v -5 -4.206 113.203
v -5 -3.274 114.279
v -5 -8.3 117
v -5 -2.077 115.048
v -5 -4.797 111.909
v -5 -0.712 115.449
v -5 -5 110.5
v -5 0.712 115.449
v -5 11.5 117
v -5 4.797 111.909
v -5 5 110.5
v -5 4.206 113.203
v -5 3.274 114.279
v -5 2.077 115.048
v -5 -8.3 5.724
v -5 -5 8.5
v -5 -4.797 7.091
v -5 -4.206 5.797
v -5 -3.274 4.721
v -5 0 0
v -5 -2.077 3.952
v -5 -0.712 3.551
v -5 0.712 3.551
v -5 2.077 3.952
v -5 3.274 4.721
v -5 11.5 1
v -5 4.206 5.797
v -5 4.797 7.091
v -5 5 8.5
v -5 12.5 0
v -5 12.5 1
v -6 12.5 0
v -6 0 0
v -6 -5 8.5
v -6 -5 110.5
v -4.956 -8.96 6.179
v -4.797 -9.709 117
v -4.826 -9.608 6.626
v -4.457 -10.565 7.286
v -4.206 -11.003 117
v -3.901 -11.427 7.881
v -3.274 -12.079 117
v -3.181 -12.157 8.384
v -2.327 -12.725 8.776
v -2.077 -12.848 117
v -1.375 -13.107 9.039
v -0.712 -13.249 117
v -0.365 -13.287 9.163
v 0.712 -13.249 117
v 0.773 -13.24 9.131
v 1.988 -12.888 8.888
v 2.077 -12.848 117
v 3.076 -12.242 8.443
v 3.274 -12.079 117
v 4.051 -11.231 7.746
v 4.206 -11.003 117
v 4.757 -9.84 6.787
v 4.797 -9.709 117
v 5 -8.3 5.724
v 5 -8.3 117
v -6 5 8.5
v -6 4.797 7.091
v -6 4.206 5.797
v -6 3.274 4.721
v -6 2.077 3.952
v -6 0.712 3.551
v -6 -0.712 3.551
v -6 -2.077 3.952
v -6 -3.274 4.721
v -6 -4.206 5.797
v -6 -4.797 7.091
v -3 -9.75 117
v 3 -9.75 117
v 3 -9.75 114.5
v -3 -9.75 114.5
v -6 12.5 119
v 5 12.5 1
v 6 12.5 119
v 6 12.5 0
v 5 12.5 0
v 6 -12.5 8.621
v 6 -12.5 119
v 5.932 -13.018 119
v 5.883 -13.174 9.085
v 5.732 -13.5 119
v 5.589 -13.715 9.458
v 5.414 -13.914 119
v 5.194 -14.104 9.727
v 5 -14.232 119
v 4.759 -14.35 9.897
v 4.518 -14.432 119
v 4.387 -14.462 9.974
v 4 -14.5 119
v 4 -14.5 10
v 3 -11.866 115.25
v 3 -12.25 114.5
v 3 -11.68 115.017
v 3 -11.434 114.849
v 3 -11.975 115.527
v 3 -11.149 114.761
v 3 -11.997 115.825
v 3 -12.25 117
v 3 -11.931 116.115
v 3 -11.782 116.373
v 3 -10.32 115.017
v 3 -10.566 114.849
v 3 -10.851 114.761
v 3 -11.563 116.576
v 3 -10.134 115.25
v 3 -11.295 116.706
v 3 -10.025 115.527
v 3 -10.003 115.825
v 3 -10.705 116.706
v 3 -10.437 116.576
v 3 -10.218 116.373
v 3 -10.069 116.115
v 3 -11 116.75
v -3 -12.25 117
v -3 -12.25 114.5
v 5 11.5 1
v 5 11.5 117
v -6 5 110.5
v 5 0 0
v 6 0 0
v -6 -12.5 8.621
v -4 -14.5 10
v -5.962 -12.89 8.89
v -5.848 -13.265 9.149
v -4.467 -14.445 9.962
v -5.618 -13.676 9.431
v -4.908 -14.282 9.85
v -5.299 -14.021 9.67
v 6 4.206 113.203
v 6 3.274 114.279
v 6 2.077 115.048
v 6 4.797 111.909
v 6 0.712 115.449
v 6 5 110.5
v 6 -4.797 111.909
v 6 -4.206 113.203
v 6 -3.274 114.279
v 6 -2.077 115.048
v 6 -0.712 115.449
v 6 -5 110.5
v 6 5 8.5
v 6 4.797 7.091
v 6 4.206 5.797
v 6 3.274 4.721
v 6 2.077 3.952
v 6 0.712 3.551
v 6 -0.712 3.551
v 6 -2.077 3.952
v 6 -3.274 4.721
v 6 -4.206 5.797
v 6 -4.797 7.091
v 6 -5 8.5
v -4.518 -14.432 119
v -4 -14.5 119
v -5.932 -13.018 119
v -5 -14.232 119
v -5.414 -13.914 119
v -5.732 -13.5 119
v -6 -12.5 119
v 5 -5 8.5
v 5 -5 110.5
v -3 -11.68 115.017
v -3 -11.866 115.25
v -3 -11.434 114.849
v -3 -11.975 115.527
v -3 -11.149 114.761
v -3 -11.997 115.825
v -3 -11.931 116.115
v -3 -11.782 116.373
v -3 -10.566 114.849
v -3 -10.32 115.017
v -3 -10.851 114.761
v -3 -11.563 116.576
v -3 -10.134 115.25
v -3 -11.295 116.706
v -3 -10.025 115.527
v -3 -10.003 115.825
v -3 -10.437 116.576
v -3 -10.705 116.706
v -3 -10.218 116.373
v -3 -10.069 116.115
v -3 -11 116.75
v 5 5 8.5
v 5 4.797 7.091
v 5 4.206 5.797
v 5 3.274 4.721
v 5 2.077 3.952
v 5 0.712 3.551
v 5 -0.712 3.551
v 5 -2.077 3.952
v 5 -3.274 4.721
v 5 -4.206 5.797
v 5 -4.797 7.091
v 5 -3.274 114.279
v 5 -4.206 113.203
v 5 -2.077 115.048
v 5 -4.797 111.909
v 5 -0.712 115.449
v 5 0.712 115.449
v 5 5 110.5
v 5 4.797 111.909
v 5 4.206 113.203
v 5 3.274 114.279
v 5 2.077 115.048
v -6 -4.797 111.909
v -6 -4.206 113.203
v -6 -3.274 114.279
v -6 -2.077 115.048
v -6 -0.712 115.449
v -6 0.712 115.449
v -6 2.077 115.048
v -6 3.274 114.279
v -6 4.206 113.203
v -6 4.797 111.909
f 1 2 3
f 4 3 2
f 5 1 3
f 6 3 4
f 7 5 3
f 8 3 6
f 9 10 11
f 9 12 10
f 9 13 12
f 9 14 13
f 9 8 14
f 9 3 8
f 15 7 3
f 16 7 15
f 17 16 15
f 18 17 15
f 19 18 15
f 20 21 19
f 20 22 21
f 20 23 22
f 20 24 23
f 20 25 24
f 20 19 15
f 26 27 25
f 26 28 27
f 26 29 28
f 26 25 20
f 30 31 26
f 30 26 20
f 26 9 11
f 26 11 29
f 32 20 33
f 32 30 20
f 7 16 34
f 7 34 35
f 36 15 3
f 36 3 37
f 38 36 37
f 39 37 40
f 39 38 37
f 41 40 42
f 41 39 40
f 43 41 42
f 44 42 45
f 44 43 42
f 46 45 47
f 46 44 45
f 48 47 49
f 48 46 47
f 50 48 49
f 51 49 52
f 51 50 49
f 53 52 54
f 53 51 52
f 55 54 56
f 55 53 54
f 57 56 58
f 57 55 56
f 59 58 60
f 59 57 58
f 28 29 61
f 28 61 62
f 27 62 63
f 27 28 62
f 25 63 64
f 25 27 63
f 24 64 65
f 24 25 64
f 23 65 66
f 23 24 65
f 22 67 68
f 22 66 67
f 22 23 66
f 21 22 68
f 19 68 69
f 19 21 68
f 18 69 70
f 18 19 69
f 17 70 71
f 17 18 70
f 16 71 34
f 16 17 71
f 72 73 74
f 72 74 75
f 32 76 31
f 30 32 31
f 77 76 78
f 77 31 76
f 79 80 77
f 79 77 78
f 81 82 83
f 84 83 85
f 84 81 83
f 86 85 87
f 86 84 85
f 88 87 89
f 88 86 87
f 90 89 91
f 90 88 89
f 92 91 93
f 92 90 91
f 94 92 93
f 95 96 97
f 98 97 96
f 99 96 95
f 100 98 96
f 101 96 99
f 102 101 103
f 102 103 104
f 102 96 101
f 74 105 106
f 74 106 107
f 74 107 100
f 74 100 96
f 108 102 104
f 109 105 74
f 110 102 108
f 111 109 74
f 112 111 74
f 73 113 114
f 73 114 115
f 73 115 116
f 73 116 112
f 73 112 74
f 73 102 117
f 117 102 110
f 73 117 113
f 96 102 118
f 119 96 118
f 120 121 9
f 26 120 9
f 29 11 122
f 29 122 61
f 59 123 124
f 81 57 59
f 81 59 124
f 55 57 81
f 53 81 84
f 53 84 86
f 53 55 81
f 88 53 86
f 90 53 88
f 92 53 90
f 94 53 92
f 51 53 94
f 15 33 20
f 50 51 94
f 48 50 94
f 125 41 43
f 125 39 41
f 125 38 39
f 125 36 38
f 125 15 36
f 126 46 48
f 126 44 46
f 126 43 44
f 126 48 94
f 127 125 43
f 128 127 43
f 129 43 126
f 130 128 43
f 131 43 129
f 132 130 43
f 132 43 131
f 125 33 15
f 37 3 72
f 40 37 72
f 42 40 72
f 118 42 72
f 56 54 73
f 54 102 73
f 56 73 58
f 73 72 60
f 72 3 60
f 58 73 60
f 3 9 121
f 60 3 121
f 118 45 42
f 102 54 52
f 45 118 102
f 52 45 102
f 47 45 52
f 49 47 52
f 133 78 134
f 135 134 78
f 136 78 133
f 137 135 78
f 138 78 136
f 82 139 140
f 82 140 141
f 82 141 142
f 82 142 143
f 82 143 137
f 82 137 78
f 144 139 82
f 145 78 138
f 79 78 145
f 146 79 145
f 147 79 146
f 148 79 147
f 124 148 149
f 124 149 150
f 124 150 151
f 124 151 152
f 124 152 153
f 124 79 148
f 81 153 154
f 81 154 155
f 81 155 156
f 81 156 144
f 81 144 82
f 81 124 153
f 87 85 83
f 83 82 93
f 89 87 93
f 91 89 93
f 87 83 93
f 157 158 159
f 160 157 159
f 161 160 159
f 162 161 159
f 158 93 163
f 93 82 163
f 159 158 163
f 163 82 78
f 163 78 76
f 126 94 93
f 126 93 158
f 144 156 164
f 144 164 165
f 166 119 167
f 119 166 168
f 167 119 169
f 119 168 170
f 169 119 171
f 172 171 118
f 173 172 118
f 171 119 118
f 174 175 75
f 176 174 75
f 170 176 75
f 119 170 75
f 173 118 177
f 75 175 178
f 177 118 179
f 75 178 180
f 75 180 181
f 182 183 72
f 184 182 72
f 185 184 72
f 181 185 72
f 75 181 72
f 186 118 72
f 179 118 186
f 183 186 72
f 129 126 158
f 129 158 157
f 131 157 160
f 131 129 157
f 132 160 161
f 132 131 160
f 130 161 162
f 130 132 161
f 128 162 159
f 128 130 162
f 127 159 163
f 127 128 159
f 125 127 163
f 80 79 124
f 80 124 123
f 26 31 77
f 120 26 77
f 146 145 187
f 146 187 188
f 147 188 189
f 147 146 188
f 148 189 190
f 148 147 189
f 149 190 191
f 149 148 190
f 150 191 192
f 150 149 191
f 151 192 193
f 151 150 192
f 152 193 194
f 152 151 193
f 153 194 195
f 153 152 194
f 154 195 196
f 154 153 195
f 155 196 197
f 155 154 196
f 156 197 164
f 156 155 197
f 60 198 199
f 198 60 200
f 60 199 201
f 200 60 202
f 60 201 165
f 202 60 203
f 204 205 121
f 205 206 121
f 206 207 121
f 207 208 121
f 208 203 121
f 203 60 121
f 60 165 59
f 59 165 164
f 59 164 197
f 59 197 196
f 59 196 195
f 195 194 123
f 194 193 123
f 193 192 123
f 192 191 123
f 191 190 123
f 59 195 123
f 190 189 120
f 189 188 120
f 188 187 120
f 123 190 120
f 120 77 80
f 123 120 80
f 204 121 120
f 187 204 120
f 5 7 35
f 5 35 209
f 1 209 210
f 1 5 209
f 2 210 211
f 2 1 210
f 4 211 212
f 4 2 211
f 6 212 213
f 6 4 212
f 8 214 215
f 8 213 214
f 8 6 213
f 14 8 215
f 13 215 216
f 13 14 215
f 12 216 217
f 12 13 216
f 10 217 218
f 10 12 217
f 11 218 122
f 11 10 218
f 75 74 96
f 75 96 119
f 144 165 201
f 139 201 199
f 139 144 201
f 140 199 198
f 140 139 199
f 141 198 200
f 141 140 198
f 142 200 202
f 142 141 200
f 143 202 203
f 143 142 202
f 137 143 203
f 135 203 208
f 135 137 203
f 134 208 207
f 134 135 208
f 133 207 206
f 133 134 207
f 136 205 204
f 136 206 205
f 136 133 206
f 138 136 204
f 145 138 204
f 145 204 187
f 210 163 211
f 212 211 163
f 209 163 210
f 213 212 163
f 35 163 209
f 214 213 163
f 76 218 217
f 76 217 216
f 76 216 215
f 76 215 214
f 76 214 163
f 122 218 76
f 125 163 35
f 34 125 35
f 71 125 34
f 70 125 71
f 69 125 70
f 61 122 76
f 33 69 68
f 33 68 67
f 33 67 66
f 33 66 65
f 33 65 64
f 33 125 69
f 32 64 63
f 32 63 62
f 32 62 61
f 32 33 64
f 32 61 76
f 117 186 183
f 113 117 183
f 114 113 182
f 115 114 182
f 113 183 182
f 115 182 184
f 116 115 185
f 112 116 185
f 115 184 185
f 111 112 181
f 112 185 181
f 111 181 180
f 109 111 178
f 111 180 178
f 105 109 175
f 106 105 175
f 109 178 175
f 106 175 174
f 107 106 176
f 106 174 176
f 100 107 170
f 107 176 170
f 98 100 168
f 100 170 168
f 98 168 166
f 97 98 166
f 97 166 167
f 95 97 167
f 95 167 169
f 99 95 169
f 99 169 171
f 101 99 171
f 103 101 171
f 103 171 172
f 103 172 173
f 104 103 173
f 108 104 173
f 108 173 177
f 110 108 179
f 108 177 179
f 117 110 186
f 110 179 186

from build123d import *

# Parameters (mm, degrees)
BOSS_EXTRUDE1_DEPTH     = 119
CUT_EXTRUDE1_DEPTH      = 117
CUT_EXTRUDE2_DEPTH      = 121.479251326
SKETCH5_W               = 10
SKETCH5_H               = 2
CUT_EXTRUDE4_DEPTH      = 123.172009888
CUT_EXTRUDE5_DEPTH      = 121.030204532
CUT_EXTRUDE5_DEPTH_BACK = 121.030204532
SKETCH7_W               = 6
SKETCH7_H               = 2.5
BOSS_EXTRUDE2_DEPTH     = 2.5
SKETCH10_R              = 1
CUT_EXTRUDE6_DEPTH      = 6


with BuildPart() as part:
    # Sketch1 → Boss-Extrude1 (new body)
    with BuildSketch(Plane.XY):
        with BuildLine():
            Line((-6, 12.5), (6, 12.5))
            Line((6, 12.5), (6, -12.5))
            ThreePointArc((6, -12.5), (5.414213562, -13.914213562), (4, -14.5))
            Line((4, -14.5), (-4, -14.5))
            ThreePointArc((-4, -14.5), (-5.414213562, -13.914213562), (-6, -12.5))
            Line((-6, -12.5), (-6, 12.5))
        make_face()
    extrude(amount=BOSS_EXTRUDE1_DEPTH)

    # Sketch2 → Cut-Extrude1 (cut)
    with BuildSketch(Plane(origin=(0, 0, 0), x_dir=(-1, 0, 0), z_dir=(0, 0, -1))):
        with BuildLine():
            Line((-5, -8.3), (-5, 11.5))
            Line((-5, 11.5), (5, 11.5))
            Line((5, 11.5), (5, -8.3))
            ThreePointArc((5, -8.3), (0, -13.3), (-5, -8.3))
        make_face()
    extrude(amount=-CUT_EXTRUDE1_DEPTH, mode=Mode.SUBTRACT)

    # Sketch3 → Cut-Extrude2 (cut, through all)
    with BuildSketch(Plane(origin=(6, 0, 0), x_dir=(0, 0, -1), z_dir=(1, 0, 0))):
        with BuildLine():
            Line((-8.499997834, -5), (-110.499997834, -5))
            ThreePointArc((-110.499997834, -5), (-115.500002166, -2.166e-06), (-110.500002166, 5))
            Line((-110.500002166, 5), (-8.500002166, 5))
            ThreePointArc((-8.500002166, 5), (-3.500002166, 2.166e-06), (-8.499997834, -5))
        make_face()
    extrude(amount=-CUT_EXTRUDE2_DEPTH, mode=Mode.SUBTRACT)

    # Sketch5 → Cut-Extrude4 (cut, through all)
    with BuildSketch(Plane(origin=(0, 12.5, 0), x_dir=(1, 0, 0), z_dir=(0, 1, 0))):
        Rectangle(SKETCH5_W, SKETCH5_H)
    extrude(amount=-CUT_EXTRUDE4_DEPTH, mode=Mode.SUBTRACT)

    # Sketch6 → Cut-Extrude5 (cut, two sides: drawn at the far end of the back side and taken through both)
    with BuildSketch(Plane(origin=(0, 0, 0), x_dir=(0, 0, -1), z_dir=(1, 0, 0)).offset(-CUT_EXTRUDE5_DEPTH_BACK)):
        Polygon((0, 0), (-10, -14.5), (0, -14.5), align=None)
    extrude(amount=CUT_EXTRUDE5_DEPTH + CUT_EXTRUDE5_DEPTH_BACK, mode=Mode.SUBTRACT)

    # Sketch7 → Boss-Extrude2 (add)
    with BuildSketch(Plane(origin=(0, 0, 117), x_dir=(-1, 0, 0), z_dir=(0, 0, -1))):
        with Locations((0, -11)):
            Rectangle(SKETCH7_W, SKETCH7_H)
    extrude(amount=BOSS_EXTRUDE2_DEPTH)

    # Sketch10 → Cut-Extrude6 (cut)
    with BuildSketch(Plane.ZY.offset(3)):
        with Locations((115.75, -11)):
            Circle(SKETCH10_R)
    extrude(amount=-CUT_EXTRUDE6_DEPTH, mode=Mode.SUBTRACT)


solid = part.part
